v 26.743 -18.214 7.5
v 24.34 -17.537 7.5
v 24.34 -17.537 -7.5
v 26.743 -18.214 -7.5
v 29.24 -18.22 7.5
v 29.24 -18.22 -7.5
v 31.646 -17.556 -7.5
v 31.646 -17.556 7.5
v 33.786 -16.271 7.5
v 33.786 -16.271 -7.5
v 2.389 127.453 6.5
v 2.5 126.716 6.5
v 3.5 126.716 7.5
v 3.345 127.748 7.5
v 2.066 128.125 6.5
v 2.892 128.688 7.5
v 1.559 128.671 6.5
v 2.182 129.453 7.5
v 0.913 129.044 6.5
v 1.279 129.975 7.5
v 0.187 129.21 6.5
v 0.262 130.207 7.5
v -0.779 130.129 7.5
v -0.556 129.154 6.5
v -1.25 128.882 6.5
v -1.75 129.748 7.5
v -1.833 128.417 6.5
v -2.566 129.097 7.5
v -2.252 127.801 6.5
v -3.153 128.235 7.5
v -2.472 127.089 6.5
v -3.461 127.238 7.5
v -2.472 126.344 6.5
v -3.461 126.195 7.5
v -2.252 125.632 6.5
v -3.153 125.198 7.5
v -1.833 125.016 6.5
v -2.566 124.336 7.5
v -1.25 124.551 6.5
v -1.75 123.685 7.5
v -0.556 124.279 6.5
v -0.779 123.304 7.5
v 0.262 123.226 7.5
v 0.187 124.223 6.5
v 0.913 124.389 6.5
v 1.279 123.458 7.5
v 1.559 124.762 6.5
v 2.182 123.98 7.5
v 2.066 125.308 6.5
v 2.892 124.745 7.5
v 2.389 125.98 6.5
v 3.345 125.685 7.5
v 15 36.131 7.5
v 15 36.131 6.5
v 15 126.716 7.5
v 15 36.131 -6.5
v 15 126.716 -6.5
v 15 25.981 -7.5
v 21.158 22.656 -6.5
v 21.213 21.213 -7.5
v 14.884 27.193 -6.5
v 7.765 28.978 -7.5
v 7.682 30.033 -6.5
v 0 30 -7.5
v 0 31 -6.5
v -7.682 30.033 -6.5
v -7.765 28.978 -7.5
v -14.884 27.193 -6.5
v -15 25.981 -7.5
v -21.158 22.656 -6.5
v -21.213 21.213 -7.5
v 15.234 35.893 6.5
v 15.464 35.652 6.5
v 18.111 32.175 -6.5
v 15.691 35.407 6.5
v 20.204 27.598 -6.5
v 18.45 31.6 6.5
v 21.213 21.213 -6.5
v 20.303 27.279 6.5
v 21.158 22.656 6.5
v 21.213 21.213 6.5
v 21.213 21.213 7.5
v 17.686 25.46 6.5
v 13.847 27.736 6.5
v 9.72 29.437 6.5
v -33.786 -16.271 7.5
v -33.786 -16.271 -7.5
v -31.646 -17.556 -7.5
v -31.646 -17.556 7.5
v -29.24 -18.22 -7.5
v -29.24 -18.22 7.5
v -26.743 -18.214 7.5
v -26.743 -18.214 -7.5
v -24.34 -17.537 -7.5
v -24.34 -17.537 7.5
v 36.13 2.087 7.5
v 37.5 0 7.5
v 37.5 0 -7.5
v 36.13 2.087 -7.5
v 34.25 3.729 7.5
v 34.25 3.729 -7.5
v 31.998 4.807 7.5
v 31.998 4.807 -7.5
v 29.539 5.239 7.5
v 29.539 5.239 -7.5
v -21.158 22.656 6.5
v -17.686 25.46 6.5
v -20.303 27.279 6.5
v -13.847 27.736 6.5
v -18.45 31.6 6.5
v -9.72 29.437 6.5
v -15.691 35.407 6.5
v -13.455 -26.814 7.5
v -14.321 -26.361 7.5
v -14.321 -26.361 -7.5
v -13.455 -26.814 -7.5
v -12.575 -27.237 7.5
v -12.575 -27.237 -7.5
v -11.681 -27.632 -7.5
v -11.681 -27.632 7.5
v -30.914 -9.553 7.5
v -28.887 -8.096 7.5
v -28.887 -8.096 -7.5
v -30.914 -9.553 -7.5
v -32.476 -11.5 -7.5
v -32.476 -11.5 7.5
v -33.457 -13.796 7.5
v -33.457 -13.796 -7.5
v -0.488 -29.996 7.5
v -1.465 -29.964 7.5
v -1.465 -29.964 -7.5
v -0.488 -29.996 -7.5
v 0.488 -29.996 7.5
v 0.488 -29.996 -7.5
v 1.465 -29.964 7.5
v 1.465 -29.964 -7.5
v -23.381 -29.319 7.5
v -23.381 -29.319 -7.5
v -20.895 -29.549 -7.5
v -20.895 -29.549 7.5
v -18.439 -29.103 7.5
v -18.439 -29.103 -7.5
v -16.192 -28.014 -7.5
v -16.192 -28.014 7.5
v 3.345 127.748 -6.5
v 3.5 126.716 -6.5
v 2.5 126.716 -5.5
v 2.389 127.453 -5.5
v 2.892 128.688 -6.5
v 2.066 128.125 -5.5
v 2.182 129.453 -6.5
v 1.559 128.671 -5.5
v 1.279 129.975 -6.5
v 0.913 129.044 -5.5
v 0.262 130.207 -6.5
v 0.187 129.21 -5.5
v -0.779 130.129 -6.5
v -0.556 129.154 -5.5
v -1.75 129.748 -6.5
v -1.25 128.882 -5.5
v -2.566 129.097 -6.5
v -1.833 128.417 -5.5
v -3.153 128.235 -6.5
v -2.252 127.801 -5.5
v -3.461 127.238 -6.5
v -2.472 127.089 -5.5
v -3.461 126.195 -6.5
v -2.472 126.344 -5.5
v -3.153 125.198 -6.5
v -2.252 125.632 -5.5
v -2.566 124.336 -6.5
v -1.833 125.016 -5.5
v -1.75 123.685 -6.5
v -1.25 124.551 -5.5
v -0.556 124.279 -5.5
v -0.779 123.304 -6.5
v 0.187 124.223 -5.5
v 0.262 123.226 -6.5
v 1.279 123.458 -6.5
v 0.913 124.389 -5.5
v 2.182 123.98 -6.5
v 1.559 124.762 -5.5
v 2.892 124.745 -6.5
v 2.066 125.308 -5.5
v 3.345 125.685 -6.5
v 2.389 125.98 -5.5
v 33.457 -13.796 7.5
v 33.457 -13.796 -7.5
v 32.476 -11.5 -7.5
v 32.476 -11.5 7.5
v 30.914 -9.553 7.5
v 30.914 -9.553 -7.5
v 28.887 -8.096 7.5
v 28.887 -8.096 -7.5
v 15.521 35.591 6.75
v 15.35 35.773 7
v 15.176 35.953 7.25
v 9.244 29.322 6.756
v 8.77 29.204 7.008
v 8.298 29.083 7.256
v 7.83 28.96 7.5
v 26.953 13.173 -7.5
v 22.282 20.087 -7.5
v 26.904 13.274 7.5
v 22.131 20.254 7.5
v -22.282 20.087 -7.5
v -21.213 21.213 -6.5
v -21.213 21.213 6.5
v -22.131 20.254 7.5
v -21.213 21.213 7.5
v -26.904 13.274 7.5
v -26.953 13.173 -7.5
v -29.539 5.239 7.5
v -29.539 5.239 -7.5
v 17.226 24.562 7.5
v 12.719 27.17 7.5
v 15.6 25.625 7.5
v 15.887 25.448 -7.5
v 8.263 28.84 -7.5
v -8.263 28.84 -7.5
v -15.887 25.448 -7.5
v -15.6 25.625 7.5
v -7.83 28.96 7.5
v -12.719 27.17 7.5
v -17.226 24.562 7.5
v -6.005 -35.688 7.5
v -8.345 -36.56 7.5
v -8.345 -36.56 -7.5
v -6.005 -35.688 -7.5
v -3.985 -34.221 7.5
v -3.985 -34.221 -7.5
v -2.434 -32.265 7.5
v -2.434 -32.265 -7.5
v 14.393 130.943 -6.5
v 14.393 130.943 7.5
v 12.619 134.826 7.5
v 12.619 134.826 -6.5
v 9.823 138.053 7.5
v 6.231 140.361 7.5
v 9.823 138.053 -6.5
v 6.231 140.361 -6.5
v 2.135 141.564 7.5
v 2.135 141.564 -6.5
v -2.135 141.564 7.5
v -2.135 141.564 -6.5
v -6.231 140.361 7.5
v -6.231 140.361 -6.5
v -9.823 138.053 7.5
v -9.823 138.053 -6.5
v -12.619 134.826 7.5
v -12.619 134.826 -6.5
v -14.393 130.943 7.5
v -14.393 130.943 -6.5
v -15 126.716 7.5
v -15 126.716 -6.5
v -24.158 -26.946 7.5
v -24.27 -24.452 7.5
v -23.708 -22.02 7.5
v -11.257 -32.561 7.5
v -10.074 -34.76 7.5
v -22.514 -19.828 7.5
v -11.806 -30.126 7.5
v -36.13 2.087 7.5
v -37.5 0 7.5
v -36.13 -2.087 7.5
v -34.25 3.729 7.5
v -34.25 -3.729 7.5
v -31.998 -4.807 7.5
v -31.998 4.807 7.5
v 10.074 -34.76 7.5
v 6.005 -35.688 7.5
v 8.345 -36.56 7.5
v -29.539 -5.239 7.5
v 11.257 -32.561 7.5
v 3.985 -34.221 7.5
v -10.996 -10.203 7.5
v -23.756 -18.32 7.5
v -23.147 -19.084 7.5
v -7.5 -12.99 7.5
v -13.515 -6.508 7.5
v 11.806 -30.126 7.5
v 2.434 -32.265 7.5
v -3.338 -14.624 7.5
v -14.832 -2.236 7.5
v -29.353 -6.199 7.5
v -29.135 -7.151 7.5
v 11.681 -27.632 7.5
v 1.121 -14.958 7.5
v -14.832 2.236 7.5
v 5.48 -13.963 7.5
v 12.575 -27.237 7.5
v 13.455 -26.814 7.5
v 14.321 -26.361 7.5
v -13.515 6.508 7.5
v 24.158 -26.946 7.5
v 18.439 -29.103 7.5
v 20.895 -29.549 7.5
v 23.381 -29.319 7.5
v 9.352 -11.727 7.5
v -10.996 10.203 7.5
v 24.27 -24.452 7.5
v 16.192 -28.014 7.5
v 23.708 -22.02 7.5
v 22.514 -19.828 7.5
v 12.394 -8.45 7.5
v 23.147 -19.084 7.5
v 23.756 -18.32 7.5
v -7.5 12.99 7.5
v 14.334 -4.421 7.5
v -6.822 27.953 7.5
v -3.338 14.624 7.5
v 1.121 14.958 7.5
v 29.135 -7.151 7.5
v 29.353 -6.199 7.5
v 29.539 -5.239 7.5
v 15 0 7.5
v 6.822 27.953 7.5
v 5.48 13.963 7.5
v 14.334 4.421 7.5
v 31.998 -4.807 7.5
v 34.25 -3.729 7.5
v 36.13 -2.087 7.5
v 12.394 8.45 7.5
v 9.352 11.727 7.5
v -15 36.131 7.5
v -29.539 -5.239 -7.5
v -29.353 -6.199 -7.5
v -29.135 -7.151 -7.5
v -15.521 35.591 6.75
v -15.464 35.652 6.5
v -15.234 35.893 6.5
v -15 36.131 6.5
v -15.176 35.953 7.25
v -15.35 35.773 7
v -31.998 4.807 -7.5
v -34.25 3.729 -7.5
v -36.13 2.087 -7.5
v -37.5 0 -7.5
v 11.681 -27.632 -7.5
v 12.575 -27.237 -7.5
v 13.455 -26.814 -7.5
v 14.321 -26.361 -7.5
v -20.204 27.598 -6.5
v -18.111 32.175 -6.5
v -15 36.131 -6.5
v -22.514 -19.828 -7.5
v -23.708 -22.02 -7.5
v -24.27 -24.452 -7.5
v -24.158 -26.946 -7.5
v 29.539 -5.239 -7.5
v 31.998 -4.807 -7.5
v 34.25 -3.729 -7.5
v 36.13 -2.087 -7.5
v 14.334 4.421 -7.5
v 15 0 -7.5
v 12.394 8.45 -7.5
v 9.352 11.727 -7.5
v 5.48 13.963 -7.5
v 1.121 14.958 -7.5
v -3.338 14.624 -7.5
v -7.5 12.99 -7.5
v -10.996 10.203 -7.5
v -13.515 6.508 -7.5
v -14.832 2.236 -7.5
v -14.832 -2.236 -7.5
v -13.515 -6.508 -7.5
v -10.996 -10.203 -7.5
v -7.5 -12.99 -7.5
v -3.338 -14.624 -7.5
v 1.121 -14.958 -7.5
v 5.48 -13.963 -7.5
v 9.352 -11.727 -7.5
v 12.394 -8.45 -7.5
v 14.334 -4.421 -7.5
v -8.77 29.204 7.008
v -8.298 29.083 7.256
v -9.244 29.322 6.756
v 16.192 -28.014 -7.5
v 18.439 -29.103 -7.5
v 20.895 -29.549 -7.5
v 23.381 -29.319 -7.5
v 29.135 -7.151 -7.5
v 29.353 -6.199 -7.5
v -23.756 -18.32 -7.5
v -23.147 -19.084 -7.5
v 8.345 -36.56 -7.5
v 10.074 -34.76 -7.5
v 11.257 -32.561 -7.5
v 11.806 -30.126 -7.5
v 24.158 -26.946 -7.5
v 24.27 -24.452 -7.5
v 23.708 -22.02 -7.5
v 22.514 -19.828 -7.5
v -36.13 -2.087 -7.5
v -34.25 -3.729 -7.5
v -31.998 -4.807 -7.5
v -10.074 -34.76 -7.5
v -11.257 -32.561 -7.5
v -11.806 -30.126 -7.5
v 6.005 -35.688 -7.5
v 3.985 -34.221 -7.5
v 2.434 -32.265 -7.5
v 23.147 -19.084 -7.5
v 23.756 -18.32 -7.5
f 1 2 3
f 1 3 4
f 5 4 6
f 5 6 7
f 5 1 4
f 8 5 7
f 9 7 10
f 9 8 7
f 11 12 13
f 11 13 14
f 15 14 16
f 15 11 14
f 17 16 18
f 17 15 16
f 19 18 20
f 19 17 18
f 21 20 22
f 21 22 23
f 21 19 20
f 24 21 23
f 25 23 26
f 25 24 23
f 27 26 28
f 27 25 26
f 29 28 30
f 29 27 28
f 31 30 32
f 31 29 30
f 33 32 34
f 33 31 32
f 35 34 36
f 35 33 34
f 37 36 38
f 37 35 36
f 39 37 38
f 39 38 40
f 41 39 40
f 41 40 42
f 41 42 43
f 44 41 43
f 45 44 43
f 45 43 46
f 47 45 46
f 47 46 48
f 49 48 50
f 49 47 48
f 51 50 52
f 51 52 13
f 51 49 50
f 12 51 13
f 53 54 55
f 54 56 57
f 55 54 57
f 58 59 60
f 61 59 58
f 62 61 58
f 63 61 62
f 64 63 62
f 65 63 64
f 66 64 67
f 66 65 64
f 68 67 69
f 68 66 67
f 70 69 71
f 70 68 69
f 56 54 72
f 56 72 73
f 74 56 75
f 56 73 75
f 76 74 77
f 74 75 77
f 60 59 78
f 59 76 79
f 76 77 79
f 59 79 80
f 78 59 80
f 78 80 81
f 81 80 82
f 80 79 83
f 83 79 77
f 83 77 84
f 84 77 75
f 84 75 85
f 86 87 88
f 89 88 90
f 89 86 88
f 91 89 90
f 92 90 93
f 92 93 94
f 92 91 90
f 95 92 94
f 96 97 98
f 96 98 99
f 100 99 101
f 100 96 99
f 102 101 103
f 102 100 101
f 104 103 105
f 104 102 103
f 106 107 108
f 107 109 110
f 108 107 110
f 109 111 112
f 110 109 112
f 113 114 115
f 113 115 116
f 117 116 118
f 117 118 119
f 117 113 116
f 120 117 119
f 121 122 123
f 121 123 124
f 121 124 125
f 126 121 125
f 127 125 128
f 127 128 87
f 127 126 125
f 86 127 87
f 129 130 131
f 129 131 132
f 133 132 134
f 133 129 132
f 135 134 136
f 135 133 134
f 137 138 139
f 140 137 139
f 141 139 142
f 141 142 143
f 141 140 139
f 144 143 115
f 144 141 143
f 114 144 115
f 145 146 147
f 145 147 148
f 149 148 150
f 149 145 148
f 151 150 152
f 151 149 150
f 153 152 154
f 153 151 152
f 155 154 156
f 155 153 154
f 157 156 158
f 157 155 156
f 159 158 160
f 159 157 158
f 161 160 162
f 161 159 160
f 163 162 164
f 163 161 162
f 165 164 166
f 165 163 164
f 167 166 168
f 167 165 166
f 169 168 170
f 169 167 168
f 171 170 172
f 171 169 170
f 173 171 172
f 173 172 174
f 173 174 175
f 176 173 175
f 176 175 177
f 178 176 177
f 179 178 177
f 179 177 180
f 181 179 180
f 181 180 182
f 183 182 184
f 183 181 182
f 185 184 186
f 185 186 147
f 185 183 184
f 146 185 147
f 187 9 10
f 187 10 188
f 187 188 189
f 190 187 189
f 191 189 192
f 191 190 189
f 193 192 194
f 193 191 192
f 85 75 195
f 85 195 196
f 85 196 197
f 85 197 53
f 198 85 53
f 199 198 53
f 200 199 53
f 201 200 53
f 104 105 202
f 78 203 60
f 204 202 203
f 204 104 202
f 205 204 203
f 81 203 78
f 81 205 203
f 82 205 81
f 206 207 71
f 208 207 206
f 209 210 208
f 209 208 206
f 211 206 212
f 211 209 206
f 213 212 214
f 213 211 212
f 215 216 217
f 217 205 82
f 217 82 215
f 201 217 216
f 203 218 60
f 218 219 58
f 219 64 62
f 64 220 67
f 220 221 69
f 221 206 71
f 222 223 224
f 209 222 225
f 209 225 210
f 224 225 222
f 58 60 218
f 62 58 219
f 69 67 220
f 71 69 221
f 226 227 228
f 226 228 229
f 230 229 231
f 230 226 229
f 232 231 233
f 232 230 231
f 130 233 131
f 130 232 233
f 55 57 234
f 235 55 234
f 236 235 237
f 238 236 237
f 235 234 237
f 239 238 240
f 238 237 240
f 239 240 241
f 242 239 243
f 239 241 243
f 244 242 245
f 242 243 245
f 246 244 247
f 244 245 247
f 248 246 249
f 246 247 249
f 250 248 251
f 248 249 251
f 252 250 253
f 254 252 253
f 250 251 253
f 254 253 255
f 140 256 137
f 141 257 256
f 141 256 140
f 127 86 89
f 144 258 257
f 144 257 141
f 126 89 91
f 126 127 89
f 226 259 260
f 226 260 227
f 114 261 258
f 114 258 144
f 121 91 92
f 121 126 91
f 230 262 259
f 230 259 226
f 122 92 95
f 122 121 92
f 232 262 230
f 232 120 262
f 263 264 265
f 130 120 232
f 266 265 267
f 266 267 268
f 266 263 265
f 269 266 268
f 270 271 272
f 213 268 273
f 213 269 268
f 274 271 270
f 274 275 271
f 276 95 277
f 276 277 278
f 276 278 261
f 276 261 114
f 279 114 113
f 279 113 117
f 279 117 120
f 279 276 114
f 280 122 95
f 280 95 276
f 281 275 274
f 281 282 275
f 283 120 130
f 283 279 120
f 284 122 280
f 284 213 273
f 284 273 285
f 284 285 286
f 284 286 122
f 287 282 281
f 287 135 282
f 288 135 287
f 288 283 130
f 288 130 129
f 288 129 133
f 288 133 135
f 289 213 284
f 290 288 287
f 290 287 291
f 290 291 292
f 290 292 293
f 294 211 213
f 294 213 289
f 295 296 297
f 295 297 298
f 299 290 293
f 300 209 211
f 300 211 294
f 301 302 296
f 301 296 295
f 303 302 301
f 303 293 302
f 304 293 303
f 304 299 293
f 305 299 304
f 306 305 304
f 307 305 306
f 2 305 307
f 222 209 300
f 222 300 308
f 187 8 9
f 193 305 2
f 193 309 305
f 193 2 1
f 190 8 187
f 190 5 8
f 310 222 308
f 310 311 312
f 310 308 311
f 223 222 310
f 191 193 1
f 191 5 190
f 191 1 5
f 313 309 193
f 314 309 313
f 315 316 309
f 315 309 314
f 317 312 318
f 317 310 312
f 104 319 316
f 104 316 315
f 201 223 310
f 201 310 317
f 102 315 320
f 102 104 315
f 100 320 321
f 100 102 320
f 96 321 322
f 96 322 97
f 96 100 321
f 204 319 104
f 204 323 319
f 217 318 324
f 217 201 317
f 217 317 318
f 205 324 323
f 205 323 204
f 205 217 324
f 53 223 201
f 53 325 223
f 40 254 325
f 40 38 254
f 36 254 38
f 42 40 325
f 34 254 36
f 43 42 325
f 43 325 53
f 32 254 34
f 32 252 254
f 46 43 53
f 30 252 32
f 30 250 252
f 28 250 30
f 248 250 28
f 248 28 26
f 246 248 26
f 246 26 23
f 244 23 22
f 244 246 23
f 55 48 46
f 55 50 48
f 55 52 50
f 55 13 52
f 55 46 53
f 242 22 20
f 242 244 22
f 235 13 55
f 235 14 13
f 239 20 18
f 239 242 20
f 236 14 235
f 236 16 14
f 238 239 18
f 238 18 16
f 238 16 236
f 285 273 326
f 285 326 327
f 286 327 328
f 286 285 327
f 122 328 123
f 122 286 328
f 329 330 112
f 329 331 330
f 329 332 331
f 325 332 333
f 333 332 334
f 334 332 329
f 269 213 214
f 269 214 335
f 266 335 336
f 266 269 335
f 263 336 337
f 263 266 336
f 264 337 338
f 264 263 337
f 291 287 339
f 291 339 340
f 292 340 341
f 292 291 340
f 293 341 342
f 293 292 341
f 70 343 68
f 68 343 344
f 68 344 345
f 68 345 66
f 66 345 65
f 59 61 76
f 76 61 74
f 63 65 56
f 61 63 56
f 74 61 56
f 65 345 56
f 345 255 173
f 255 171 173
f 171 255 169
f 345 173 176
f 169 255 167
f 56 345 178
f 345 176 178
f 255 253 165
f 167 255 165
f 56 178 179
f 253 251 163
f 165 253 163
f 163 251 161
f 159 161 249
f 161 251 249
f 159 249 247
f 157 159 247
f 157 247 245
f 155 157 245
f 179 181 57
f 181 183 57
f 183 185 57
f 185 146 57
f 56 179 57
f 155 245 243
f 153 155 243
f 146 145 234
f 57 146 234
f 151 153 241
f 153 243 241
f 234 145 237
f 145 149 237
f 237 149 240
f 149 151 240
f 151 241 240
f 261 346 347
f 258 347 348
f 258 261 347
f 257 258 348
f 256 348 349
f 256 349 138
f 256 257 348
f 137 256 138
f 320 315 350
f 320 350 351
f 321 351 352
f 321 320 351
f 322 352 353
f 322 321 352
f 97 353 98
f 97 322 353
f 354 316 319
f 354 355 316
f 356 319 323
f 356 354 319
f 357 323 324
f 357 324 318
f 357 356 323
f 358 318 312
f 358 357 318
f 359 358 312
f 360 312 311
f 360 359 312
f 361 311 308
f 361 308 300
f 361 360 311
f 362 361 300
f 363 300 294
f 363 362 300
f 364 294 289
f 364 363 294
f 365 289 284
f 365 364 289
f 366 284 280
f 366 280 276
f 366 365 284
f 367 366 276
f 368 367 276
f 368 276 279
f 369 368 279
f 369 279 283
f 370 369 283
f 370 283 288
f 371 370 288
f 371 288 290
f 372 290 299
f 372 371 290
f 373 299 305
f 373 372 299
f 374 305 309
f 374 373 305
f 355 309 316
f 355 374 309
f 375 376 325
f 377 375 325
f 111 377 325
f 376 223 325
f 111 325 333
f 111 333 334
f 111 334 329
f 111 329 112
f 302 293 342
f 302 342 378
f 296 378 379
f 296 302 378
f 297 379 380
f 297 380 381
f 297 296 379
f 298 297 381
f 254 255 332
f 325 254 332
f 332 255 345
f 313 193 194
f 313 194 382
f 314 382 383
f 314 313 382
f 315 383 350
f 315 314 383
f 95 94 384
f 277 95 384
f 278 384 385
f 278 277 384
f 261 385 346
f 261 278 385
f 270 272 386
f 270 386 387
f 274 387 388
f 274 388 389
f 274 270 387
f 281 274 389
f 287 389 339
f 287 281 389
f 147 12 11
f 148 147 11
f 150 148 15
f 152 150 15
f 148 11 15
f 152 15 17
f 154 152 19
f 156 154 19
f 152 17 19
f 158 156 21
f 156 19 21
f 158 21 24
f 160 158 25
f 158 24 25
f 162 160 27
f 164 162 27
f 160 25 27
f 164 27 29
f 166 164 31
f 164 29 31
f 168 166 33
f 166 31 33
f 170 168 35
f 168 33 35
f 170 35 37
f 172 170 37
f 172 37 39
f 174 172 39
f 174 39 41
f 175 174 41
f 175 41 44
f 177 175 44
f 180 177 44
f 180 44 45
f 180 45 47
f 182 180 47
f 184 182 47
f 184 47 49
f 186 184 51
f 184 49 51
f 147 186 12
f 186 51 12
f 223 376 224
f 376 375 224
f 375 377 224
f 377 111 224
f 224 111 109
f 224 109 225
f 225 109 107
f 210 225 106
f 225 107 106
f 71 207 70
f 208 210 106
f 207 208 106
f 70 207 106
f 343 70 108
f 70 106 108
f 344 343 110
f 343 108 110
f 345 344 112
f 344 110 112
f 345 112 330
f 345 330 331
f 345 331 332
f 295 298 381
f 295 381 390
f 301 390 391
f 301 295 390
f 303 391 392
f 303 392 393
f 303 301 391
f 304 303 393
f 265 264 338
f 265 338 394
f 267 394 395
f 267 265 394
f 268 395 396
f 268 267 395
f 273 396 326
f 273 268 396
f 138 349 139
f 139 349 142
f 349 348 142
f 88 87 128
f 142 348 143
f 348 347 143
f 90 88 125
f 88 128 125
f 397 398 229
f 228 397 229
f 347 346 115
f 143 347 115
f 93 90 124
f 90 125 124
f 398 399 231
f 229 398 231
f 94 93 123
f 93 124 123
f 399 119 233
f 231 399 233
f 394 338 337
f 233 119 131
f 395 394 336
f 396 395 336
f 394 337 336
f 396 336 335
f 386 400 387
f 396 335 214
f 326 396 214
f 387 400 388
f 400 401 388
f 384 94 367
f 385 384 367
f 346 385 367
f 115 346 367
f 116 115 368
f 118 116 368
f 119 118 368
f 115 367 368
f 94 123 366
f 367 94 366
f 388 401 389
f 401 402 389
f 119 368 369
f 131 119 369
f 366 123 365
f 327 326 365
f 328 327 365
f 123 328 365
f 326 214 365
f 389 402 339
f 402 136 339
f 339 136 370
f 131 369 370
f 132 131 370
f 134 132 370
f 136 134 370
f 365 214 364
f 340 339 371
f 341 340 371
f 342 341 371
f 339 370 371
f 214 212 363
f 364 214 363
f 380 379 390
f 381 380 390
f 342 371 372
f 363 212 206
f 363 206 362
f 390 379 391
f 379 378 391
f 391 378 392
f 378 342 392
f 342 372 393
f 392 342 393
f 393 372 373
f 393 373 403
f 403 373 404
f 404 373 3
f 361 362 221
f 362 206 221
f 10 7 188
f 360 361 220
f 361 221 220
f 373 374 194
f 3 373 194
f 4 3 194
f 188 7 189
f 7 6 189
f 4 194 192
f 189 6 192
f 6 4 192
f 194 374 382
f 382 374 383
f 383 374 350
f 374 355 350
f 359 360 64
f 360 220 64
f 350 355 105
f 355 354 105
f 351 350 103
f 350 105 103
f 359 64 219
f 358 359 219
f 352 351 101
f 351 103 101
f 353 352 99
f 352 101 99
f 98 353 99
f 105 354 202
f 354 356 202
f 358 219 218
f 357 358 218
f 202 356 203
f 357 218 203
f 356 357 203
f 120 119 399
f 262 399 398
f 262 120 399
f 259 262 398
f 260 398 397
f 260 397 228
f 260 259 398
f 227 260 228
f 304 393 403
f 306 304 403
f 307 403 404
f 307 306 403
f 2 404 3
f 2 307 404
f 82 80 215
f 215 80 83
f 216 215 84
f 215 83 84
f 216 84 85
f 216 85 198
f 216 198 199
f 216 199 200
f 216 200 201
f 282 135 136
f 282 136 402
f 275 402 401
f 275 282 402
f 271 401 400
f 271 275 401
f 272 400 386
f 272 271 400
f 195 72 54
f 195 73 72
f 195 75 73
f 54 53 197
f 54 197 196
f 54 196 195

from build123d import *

# Parameters (mm, degrees)
SKETCH2_R           = 30
SKETCH2_R_2         = 15
BOSS_EXTRUDE1_DEPTH = 7.5
BOSS_EXTRUDE2_DEPTH = 6.5
CHAMFER2_SIZE       = 1
BOSS_EXTRUDE3_DEPTH = 14
CHAMFER3_SIZE       = 1
SKETCH6_R           = 2.5
CUT_EXTRUDE1_DEPTH  = 14
CHAMFER4_SIZE       = 1
CHAMFER5_SIZE       = 1
BOSS_EXTRUDE4_DEPTH = 15


# Some blends are built 0.0001 mm under size
with BuildPart() as part:
    # Sketch2 → Boss-Extrude1 (new, symmetric)
    with BuildSketch(Plane.XY):
        Circle(SKETCH2_R)
        Circle(SKETCH2_R_2, mode=Mode.SUBTRACT)
    extrude(amount=BOSS_EXTRUDE1_DEPTH, both=True)

    # Sketch4 → Boss-Extrude2 (add, symmetric)
    with BuildSketch(Plane.XY):
        with BuildLine():
            ThreePointArc((-21.213203436, 21.213203436), (0, 42.343834222), (21.213203436, 21.213203436))
            ThreePointArc((21.213203436, 21.213203436), (0, 30), (-21.213203436, 21.213203436))
        make_face()
    extrude(amount=BOSS_EXTRUDE2_DEPTH, both=True)

    # Chamfer2
    chamfer2_edges = [part.edges().sort_by_distance(p)[0] for p in [
        (0, 30, -6.5),
        (0, 30, 6.5),
    ]]
    chamfer(chamfer2_edges, length=CHAMFER2_SIZE - 0.0001)  # a hair under: the kernel refuses the full size

    # Sketch5 → Boss-Extrude3 (add)
    with BuildSketch(Plane(origin=(0, 0, -6.5), x_dir=(-1, 0, 0), z_dir=(0, 0, -1))):
        with BuildLine():
            Line((0, 21.130469451), (-15.000114081, 36.130583532))
            Line((-15.000114081, 36.130583532), (-15.000114081, 126.716493473))
            ThreePointArc((-15.000114081, 126.716493473), (0, 141.716607555), (15.000114081, 126.716493473))
            Line((15.000114081, 126.716493473), (15.000114081, 36.130583532))
            Line((15.000114081, 36.130583532), (0, 21.130469451))
        make_face()
    extrude(amount=-BOSS_EXTRUDE3_DEPTH)

    # Chamfer3
    # the kernel refuses this chamfer: 1 mm, written as the material it adds along each edge
    with BuildSketch(Plane(origin=(6.82237013, 27.952839581, 6.5), x_dir=(0.7068394360706772, -0.7068394360706699, -0.02749587661058651), z_dir=(0.7071067811865439, 0.7071067811865512, 0))) as chamfer3_piece_1_section:
        Polygon((CHAMFER3_SIZE * 0.999621916911, -CHAMFER3_SIZE * 0.0274958766106), (-CHAMFER3_SIZE * 0.0274958766106, -CHAMFER3_SIZE * 0.999621916911), (0, 0), align=None)
    chamfer3_piece_1 = extrude(amount=14.136759393, mode=Mode.PRIVATE)
    chamfer3_piece_1 = chamfer3_piece_1 & Plane(origin=(0, 21.130469451, 6.845303942), x_dir=(-0.9999923946286841, 0.003900087792649399, 0), z_dir=(0, 0, 1)) * Cylinder(21.213364771, 33, mode=Mode.PRIVATE)
    add(chamfer3_piece_1)
    with BuildSketch(Plane(origin=(-16.818568561, 37.949038012, 6.5), x_dir=(0.019442520806013823, 0.019442520806013757, 0.9996219169112968), z_dir=(0.7071067811865464, -0.7071067811865487, 0))) as chamfer3_piece_2_section:
        Polygon((CHAMFER3_SIZE * 0.999621916911, CHAMFER3_SIZE * 0.0274958766106), (-CHAMFER3_SIZE * 0.0274958766106, CHAMFER3_SIZE * 0.999621916911), (0, 0), align=None)
    chamfer3_piece_2 = extrude(amount=14.136759393, mode=Mode.PRIVATE)
    chamfer3_piece_2 = chamfer3_piece_2 & Plane(origin=(0, 21.130469451, 6.750596564), x_dir=(-0.9999923946286841, 0.003900087792649399, 0), z_dir=(0, 0, 1)) * Cylinder(21.213364771, 33, mode=Mode.PRIVATE)
    add(chamfer3_piece_2)

    # Sketch6 → Cut-Extrude1 (cut)
    with BuildSketch(Plane.XY.offset(7.5)):
        with Locations((0, 126.716493473)):
            Circle(SKETCH6_R)
    extrude(amount=-CUT_EXTRUDE1_DEPTH, mode=Mode.SUBTRACT)

    # Chamfer4
    chamfer4_edges = [part.edges().sort_by_distance(p)[0] for p in [
        (-2.5, 126.716493473, 7.5),
    ]]
    chamfer(chamfer4_edges, length=CHAMFER4_SIZE)

    # Chamfer5
    chamfer5_edges = [part.edges().sort_by_distance(p)[0] for p in [
        (-2.5, 126.716493473, -6.5),
    ]]
    chamfer(chamfer5_edges, length=CHAMFER5_SIZE)

    # Sketch7 → Boss-Extrude4 (add)
    with BuildSketch(Plane.XY.offset(7.5)):
        with BuildLine():
            ThreePointArc((-29.538927614, 5.23944228), (-34.249735627, 3.72933291), (-37.5, 0))
            ThreePointArc((-37.5, 0), (-34.249735627, -3.72933291), (-29.538927614, -5.23944228))
            ThreePointArc((-29.538927614, -5.23944228), (-30, 0), (-29.538927614, 5.23944228))
        make_face()
        with BuildLine():
            ThreePointArc((-28.886962979, -8.095885983), (-32.476042442, -11.500390508), (-33.786332546, -16.270640217))
            ThreePointArc((-33.786332546, -16.270640217), (-29.239848627, -18.220416208), (-24.340345364, -17.537034743))
            ThreePointArc((-24.340345364, -17.537034743), (-27.029066037, -13.016512174), (-28.886962979, -8.095885983))
        make_face()
        with BuildLine():
            ThreePointArc((-22.513581051, -19.827724738), (-24.270070758, -24.452320542), (-23.38086757, -29.318680593))
            ThreePointArc((-23.38086757, -29.318680593), (-18.438651002, -29.102722617), (-14.3208592, -26.361202396))
            ThreePointArc((-14.3208592, -26.361202396), (-18.704694056, -23.454944474), (-22.513581051, -19.827724738))
        make_face()
        with BuildLine():
            ThreePointArc((-11.681108284, -27.632439437), (-11.257113908, -32.561168606), (-8.344535023, -36.559796707))
            ThreePointArc((-8.344535023, -36.559796707), (-3.985452411, -34.22087789), (-1.464951237, -29.964210617))
            ThreePointArc((-1.464951237, -29.964210617), (-6.675628019, -29.247837365), (-11.681108284, -27.632439437))
        make_face()
        with BuildLine():
            ThreePointArc((1.464951237, -29.964210617), (3.985452411, -34.22087789), (8.344535023, -36.559796707))
            ThreePointArc((8.344535023, -36.559796707), (11.257113908, -32.561168606), (11.681108284, -27.632439437))
            ThreePointArc((11.681108284, -27.632439437), (6.675628019, -29.247837365), (1.464951237, -29.964210617))
        make_face()
        with BuildLine():
            ThreePointArc((14.3208592, -26.361202396), (18.438651002, -29.102722617), (23.38086757, -29.318680593))
            ThreePointArc((23.38086757, -29.318680593), (24.270070758, -24.452320542), (22.513581051, -19.827724738))
            ThreePointArc((22.513581051, -19.827724738), (18.704694056, -23.454944474), (14.3208592, -26.361202396))
        make_face()
        with BuildLine():
            ThreePointArc((33.786332546, -16.270640217), (32.476042442, -11.500390508), (28.886962979, -8.095885983))
            ThreePointArc((28.886962979, -8.095885983), (27.029066037, -13.016512174), (24.340345364, -17.537034743))
            ThreePointArc((24.340345364, -17.537034743), (29.239848627, -18.220416208), (33.786332546, -16.270640217))
        make_face()
        with BuildLine():
            ThreePointArc((29.538927614, 5.23944228), (29.884509603, 2.629845202), (30, 0))
            ThreePointArc((30, 0), (29.884509603, -2.629845202), (29.538927614, -5.23944228))
            ThreePointArc((29.538927614, -5.23944228), (34.249735627, -3.72933291), (37.5, 0))
            ThreePointArc((37.5, 0), (34.249735627, 3.72933291), (29.538927614, 5.23944228))
        make_face()
    extrude(amount=-BOSS_EXTRUDE4_DEPTH)


solid = part.part
